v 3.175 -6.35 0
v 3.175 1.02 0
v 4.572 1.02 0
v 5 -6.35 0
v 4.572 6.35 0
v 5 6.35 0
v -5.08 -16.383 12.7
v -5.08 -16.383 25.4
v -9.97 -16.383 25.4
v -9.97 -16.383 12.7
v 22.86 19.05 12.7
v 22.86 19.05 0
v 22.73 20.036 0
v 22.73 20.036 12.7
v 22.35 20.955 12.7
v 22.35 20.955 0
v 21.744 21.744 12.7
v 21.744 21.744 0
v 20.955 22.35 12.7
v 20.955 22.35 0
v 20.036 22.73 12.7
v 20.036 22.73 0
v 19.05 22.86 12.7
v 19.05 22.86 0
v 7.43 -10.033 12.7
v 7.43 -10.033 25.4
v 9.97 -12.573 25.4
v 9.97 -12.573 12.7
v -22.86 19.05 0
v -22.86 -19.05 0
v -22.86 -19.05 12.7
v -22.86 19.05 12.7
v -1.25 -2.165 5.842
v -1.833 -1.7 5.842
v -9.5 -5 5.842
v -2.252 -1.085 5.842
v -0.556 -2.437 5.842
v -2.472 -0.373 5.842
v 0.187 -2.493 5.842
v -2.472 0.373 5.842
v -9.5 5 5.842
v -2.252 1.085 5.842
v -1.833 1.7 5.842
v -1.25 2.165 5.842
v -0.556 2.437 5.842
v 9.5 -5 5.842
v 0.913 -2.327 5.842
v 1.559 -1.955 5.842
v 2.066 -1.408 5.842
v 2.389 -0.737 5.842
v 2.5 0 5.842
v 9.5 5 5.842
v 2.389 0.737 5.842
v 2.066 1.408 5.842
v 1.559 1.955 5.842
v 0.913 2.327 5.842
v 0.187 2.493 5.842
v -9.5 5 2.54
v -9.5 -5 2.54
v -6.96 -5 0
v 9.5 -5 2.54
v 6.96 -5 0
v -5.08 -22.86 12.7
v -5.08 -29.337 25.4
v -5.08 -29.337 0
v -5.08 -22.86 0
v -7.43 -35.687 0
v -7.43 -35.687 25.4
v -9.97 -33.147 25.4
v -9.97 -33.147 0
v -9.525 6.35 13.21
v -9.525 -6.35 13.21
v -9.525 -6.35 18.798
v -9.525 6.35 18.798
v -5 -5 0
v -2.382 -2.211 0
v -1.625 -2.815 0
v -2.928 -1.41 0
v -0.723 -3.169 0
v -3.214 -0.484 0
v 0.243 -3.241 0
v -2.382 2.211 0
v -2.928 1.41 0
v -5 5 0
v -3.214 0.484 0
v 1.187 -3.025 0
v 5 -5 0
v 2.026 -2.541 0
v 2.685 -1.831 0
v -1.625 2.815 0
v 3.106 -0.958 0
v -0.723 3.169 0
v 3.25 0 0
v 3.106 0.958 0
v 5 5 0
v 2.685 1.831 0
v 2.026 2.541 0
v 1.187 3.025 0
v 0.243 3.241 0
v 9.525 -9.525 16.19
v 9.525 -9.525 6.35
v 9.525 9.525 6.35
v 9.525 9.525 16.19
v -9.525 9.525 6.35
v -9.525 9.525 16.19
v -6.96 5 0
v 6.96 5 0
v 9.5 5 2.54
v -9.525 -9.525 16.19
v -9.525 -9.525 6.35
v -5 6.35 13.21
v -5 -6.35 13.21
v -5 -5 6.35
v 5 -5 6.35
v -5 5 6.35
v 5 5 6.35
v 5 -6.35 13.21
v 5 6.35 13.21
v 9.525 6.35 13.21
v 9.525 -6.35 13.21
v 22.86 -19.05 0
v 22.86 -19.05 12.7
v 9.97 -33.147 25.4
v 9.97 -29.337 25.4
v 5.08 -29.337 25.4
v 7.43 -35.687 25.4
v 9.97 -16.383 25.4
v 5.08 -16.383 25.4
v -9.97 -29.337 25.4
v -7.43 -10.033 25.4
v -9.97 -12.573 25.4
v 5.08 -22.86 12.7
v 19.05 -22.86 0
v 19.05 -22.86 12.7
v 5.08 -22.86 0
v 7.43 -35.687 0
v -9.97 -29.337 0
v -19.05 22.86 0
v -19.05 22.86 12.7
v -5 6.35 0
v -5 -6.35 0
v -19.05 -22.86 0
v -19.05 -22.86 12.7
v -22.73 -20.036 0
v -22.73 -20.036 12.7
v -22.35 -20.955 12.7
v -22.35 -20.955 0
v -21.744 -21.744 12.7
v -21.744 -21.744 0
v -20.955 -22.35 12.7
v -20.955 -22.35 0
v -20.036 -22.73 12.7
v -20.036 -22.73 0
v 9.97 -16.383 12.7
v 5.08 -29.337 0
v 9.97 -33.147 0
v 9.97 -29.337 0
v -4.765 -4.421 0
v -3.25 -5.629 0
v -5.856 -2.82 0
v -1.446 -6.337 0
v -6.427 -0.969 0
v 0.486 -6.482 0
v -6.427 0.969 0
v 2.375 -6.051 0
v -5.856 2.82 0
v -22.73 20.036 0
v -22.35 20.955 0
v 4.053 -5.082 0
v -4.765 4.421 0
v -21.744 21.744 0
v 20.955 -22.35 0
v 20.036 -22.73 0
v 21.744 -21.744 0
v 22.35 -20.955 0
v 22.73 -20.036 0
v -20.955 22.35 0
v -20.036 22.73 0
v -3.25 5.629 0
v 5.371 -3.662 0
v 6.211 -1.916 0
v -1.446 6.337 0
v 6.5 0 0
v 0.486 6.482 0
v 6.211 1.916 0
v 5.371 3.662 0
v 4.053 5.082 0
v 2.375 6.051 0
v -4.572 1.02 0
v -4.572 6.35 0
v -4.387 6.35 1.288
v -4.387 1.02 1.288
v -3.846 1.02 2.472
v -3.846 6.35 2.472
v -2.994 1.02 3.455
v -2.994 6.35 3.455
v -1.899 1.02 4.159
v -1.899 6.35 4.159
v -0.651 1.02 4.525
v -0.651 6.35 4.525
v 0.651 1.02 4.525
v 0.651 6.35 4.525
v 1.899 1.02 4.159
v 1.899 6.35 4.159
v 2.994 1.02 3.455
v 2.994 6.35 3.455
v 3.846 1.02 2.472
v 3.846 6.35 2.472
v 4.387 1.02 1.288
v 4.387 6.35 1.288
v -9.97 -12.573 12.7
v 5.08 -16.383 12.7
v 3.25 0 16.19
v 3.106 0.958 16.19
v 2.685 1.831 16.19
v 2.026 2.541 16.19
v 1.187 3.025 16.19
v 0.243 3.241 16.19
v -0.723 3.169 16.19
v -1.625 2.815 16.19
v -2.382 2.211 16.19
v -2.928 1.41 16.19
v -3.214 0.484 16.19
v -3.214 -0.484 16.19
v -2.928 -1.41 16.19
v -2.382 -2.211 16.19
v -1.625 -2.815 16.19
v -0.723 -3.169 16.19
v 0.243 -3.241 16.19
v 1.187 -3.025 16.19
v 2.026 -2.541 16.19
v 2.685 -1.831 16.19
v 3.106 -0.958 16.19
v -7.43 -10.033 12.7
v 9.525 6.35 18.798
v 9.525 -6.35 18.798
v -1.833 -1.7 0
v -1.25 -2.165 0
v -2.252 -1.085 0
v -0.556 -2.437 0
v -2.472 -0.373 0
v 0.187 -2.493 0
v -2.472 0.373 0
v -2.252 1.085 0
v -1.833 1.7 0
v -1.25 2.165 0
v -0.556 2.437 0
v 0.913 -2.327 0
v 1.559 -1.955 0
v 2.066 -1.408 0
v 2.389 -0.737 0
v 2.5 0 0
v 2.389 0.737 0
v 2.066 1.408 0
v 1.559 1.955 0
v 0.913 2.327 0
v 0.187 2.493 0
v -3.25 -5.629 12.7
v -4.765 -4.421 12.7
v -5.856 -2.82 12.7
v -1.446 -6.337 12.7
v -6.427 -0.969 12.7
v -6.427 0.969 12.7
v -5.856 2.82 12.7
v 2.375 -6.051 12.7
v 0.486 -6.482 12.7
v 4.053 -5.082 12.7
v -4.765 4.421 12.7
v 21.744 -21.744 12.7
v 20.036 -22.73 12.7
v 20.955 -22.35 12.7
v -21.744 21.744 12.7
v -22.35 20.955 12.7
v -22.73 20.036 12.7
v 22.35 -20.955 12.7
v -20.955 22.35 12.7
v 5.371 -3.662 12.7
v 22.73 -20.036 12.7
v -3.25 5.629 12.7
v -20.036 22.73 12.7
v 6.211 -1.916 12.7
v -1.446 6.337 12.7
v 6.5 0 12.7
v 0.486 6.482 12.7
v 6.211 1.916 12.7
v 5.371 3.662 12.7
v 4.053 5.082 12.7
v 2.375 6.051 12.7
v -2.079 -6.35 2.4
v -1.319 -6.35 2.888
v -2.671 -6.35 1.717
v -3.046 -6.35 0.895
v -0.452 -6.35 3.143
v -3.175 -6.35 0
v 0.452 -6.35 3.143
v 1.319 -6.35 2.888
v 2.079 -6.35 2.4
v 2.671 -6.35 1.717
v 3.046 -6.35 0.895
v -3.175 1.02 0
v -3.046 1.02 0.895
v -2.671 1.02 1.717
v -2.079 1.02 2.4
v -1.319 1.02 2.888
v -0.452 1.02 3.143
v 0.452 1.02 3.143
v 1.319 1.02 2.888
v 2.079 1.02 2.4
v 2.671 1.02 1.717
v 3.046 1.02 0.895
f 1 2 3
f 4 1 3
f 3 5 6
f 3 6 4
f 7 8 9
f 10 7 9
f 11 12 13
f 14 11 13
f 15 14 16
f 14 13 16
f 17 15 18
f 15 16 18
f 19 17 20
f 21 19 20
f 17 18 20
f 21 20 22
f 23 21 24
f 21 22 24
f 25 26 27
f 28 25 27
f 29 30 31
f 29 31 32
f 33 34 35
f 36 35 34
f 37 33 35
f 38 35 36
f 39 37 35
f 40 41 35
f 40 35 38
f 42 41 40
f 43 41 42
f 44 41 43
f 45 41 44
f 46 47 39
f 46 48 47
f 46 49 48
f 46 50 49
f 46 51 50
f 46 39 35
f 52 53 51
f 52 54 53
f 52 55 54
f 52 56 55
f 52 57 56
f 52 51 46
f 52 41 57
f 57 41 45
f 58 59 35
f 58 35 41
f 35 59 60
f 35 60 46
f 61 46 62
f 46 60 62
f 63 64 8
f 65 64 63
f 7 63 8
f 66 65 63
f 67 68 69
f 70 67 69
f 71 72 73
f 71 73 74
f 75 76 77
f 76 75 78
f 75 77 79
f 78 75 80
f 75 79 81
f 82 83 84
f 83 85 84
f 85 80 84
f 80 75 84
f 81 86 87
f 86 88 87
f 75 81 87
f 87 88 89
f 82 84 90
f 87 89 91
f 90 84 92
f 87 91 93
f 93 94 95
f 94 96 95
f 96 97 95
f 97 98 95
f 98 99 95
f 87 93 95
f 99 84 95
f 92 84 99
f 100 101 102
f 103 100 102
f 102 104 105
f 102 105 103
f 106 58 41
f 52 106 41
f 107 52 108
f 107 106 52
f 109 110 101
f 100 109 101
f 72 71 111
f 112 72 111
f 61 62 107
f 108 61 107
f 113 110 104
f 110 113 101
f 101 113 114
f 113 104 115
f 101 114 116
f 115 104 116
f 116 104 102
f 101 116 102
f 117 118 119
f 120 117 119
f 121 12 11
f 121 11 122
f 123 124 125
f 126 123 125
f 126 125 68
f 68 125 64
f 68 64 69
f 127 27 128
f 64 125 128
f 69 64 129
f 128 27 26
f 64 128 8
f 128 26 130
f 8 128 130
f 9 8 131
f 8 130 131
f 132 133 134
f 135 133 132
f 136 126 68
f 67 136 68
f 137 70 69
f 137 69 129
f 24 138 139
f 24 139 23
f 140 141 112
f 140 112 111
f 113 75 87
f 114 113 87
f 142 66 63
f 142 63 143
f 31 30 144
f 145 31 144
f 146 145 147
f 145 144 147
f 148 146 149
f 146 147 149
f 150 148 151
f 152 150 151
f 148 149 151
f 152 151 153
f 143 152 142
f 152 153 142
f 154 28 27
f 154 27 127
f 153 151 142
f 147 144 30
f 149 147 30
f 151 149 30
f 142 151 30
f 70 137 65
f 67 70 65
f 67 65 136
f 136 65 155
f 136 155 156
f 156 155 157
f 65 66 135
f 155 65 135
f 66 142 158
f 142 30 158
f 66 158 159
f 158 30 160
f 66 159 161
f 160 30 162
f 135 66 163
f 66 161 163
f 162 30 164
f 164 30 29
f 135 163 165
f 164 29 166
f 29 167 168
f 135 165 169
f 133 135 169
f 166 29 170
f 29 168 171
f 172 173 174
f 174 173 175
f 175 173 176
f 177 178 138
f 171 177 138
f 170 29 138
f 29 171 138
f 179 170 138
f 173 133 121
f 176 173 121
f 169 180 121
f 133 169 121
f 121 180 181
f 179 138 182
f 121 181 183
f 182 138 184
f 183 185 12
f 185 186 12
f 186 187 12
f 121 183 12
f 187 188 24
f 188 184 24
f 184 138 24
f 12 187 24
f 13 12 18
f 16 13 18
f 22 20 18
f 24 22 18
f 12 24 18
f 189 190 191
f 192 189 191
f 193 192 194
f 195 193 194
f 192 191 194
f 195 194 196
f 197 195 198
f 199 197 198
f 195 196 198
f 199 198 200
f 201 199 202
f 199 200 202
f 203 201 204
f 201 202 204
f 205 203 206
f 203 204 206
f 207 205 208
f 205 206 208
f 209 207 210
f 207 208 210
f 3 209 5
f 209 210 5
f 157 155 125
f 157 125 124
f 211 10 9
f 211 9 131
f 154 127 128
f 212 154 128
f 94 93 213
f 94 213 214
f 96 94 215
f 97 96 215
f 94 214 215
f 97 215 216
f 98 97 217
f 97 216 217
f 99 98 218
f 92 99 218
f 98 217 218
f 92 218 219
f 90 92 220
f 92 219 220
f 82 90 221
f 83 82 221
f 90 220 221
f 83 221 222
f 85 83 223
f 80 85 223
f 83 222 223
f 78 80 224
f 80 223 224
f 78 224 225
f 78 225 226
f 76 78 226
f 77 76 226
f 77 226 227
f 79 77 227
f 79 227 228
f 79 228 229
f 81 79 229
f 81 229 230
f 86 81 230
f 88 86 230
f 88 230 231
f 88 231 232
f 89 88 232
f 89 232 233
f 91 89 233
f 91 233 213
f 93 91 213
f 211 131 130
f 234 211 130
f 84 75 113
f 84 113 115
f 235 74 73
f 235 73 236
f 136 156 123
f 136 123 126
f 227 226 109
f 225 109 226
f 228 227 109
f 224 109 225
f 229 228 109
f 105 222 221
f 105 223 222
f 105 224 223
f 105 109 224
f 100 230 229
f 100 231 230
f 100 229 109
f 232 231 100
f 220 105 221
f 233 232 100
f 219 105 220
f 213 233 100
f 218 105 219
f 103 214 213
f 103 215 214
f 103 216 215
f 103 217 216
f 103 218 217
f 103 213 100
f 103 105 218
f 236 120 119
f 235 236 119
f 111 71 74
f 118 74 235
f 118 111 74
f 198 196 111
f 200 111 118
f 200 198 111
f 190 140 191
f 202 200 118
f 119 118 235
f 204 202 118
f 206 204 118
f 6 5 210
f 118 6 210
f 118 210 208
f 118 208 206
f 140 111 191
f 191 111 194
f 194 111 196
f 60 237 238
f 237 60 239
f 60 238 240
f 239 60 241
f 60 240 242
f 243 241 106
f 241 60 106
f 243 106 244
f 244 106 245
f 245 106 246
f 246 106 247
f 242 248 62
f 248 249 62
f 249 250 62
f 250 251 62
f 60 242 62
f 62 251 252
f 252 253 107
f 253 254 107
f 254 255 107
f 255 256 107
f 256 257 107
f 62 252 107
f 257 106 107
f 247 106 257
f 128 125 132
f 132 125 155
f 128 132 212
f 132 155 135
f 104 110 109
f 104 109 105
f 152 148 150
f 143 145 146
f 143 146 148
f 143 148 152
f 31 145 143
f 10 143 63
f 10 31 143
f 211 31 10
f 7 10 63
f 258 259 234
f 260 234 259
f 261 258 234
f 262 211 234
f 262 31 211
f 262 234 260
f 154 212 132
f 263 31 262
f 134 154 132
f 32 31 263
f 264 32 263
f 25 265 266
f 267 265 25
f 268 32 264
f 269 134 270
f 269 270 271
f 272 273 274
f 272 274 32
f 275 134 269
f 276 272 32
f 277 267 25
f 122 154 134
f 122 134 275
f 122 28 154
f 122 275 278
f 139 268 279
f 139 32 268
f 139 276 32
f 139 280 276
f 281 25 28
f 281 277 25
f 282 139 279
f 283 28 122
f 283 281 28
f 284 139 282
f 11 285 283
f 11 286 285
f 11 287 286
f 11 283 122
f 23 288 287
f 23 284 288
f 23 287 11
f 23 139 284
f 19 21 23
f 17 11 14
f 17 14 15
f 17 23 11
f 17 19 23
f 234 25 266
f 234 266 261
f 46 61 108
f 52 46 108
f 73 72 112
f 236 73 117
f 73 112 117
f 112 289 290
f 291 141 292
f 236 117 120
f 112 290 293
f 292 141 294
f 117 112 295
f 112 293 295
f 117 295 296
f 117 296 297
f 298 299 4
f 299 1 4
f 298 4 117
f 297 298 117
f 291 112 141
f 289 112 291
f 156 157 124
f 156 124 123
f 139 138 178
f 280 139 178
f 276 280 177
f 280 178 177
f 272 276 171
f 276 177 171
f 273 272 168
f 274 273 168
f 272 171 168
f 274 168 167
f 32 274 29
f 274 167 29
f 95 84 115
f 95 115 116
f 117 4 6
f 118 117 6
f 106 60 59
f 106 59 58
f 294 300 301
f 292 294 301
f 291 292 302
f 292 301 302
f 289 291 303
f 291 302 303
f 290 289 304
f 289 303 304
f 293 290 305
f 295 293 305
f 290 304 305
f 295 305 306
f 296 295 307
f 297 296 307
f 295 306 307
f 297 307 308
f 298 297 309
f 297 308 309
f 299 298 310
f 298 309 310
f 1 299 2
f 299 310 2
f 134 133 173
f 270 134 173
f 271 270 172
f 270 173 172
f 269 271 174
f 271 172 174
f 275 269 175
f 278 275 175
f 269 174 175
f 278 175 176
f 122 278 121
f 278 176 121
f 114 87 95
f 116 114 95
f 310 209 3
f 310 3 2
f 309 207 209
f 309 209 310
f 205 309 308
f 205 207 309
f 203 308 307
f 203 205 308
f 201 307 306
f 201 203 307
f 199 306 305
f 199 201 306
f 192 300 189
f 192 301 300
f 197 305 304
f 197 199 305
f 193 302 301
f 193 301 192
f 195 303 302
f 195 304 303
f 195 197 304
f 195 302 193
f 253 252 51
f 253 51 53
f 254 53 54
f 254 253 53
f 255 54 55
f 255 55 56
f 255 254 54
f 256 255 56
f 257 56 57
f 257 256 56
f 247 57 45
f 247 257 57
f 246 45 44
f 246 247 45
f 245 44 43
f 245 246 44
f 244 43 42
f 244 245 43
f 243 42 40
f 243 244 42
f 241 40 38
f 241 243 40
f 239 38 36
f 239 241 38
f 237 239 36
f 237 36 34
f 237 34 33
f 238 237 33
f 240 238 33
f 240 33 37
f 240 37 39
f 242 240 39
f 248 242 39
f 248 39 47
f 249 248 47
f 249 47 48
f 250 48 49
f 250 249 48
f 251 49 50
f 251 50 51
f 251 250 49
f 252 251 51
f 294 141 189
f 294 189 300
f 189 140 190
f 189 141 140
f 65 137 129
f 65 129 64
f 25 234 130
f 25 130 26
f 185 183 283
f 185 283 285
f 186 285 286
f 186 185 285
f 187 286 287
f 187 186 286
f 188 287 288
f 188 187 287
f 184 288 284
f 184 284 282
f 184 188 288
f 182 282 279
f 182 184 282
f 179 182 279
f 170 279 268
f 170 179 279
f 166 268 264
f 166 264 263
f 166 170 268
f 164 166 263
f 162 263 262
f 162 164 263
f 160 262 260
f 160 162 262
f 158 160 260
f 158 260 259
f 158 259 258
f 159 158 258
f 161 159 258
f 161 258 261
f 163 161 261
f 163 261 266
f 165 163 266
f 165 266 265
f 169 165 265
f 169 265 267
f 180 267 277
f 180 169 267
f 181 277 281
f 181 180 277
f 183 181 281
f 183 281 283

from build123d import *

# Parameters (mm, degrees)
SKETCH_W        = 19
SKETCH_H        = 10
SKETCH_R        = 2.5
PAD_DEPTH       = 5.842
CHAMFER_SIZE    = 2.54
SKETCH001_W     = 10
SKETCH001_H     = 10
PAD001_DEPTH    = 6.35
SKETCH002_W     = 19.05
SKETCH002_H     = 19.05
PAD002_DEPTH    = 9.84
SKETCH003_R     = 3.25
POCKET_DEPTH    = 16.191
SKETCH004_W     = 10
SKETCH004_H     = 12.7
PAD003_DEPTH    = 13.21
SKETCH005_W     = 19.05
SKETCH005_H     = 12.7
PAD004_DEPTH    = 5.588
SKETCH006_R     = 3.175
POCKET001_DEPTH = 12.701
SKETCH007_R     = 4.572
POCKET002_DEPTH = 5.33
SKETCH008_R     = 6.5
PAD005_DEPTH    = 12.7
SKETCH011_W     = 10.16
SKETCH011_H     = 12.7
PAD008_DEPTH    = 6.477
SKETCH012_W     = 19.939
SKETCH012_H     = 12.7
PAD009_DEPTH    = 6.35
CHAMFER001_SIZE = 2.54
PAD010_DEPTH    = 12.7


with BuildPart() as f_4545_nut_m5:
    # Sketch → Pad (new body)
    with BuildSketch(Plane.XY):
        Rectangle(SKETCH_W, SKETCH_H)
        Circle(SKETCH_R, mode=Mode.SUBTRACT)
    extrude(amount=PAD_DEPTH)

    # Chamfer
    chamfer_edges = [f_4545_nut_m5.edges().sort_by_distance(p)[0] for p in [
        (-9.5, 0, 0),
        (9.5, 0, 0),
    ]]
    chamfer(chamfer_edges, length=CHAMFER_SIZE)


with BuildPart() as vrail_spacer:
    # Sketch001 → Pad001 (new body)
    with BuildSketch(Plane.XY):
        Rectangle(SKETCH001_W, SKETCH001_H)
    extrude(amount=PAD001_DEPTH)

    # Sketch002 (on Face6 of Pad001) → Pad002 (join)
    with BuildSketch(Plane.XY.offset(6.35)):
        Rectangle(SKETCH002_W, SKETCH002_H)
    extrude(amount=PAD002_DEPTH)

    # Sketch003 (on Face5 of Pad002) → Pocket (cut, through all)
    with BuildSketch(Plane.XY.offset(16.19)):
        Circle(SKETCH003_R)
    extrude(amount=-POCKET_DEPTH, mode=Mode.SUBTRACT)


with BuildPart() as sliding_nut:
    # Sketch004 → Pad003 (new body)
    with BuildSketch(Plane.XY):
        Rectangle(SKETCH004_W, SKETCH004_H)
    extrude(amount=PAD003_DEPTH)

    # Sketch005 (on Face6 of Pad003) → Pad004 (join)
    with BuildSketch(Plane.XY.offset(13.21)):
        Rectangle(SKETCH005_W, SKETCH005_H)
    extrude(amount=PAD004_DEPTH)

    # Sketch006 (on Face5 of Pad004) → Pocket001 (cut, through all)
    with BuildSketch(Plane(origin=(0, 6.35, 0), x_dir=(-1, 0, 0), z_dir=(0, 1, 0))):
        Circle(SKETCH006_R)
    extrude(amount=-POCKET001_DEPTH, mode=Mode.SUBTRACT)

    # Sketch007 (on Face5 of Pocket001) → Pocket002 (cut)
    with BuildSketch(Plane(origin=(0, 6.35, 0), x_dir=(-1, 0, 0), z_dir=(0, 1, 0))):
        Circle(SKETCH007_R)
    extrude(amount=-POCKET002_DEPTH, mode=Mode.SUBTRACT)


with BuildPart() as window_cap:
    # Sketch008 → Pad005 (new body)
    with BuildSketch(Plane.XY):
        with BuildLine():
            Line((-19.05, 22.86), (19.05, 22.86))
            ThreePointArc((22.86, 19.05), (21.744077, 21.744077), (19.05, 22.86))
            Line((22.86, 19.05), (22.86, -19.05))
            ThreePointArc((19.05, -22.86), (21.744077, -21.744077), (22.86, -19.05))
            Line((19.05, -22.86), (-19.05, -22.86))
            ThreePointArc((-22.86, -19.05), (-21.744077, -21.744077), (-19.05, -22.86))
            Line((-22.86, -19.05), (-22.86, 19.05))
            ThreePointArc((-19.05, 22.86), (-21.744077, 21.744077), (-22.86, 19.05))
        make_face()
        Circle(SKETCH008_R, mode=Mode.SUBTRACT)
    extrude(amount=PAD005_DEPTH)

    # Sketch011 (on Face5 of Pad005) → Pad008 (join)
    with BuildSketch(Plane.XZ.offset(22.86)):
        with Locations((0, 6.35)):
            Rectangle(SKETCH011_W, SKETCH011_H)
    extrude(amount=PAD008_DEPTH)

    # Sketch012 (on Face17 of Pad008) → Pad009 (join)
    with BuildSketch(Plane.XZ.offset(29.337)):
        with Locations((0, 6.35)):
            Rectangle(SKETCH012_W, SKETCH012_H)
    extrude(amount=PAD009_DEPTH)

    # Chamfer001
    chamfer001_edges = [window_cap.edges().sort_by_distance(p)[0] for p in [
        (-9.9695, -35.687, 6.35),
        (9.9695, -35.687, 6.35),
    ]]
    chamfer(chamfer001_edges, length=CHAMFER001_SIZE)

    # Sketch013 (on Face13 of Chamfer001) → Pad010 (join)
    with BuildSketch(Plane.XY.offset(12.7)):
        Polygon((-7.4295, -10.033), (7.4295, -10.033), (9.9695, -12.573), (9.9695, -16.383), (5.08, -16.383), (5.08, -22.86), (5.08, -29.337), (9.9695, -29.337), (9.9695, -33.147), (7.4295, -35.687), (-7.4295, -35.687), (-9.9695, -33.147), (-9.9695, -29.337), (-5.08, -29.337), (-5.08, -16.383), (-9.9695, -16.383), (-9.9695, -12.573), align=None)
    extrude(amount=PAD010_DEPTH)


solid = Compound([f_4545_nut_m5.part, vrail_spacer.part, sliding_nut.part, window_cap.part])
